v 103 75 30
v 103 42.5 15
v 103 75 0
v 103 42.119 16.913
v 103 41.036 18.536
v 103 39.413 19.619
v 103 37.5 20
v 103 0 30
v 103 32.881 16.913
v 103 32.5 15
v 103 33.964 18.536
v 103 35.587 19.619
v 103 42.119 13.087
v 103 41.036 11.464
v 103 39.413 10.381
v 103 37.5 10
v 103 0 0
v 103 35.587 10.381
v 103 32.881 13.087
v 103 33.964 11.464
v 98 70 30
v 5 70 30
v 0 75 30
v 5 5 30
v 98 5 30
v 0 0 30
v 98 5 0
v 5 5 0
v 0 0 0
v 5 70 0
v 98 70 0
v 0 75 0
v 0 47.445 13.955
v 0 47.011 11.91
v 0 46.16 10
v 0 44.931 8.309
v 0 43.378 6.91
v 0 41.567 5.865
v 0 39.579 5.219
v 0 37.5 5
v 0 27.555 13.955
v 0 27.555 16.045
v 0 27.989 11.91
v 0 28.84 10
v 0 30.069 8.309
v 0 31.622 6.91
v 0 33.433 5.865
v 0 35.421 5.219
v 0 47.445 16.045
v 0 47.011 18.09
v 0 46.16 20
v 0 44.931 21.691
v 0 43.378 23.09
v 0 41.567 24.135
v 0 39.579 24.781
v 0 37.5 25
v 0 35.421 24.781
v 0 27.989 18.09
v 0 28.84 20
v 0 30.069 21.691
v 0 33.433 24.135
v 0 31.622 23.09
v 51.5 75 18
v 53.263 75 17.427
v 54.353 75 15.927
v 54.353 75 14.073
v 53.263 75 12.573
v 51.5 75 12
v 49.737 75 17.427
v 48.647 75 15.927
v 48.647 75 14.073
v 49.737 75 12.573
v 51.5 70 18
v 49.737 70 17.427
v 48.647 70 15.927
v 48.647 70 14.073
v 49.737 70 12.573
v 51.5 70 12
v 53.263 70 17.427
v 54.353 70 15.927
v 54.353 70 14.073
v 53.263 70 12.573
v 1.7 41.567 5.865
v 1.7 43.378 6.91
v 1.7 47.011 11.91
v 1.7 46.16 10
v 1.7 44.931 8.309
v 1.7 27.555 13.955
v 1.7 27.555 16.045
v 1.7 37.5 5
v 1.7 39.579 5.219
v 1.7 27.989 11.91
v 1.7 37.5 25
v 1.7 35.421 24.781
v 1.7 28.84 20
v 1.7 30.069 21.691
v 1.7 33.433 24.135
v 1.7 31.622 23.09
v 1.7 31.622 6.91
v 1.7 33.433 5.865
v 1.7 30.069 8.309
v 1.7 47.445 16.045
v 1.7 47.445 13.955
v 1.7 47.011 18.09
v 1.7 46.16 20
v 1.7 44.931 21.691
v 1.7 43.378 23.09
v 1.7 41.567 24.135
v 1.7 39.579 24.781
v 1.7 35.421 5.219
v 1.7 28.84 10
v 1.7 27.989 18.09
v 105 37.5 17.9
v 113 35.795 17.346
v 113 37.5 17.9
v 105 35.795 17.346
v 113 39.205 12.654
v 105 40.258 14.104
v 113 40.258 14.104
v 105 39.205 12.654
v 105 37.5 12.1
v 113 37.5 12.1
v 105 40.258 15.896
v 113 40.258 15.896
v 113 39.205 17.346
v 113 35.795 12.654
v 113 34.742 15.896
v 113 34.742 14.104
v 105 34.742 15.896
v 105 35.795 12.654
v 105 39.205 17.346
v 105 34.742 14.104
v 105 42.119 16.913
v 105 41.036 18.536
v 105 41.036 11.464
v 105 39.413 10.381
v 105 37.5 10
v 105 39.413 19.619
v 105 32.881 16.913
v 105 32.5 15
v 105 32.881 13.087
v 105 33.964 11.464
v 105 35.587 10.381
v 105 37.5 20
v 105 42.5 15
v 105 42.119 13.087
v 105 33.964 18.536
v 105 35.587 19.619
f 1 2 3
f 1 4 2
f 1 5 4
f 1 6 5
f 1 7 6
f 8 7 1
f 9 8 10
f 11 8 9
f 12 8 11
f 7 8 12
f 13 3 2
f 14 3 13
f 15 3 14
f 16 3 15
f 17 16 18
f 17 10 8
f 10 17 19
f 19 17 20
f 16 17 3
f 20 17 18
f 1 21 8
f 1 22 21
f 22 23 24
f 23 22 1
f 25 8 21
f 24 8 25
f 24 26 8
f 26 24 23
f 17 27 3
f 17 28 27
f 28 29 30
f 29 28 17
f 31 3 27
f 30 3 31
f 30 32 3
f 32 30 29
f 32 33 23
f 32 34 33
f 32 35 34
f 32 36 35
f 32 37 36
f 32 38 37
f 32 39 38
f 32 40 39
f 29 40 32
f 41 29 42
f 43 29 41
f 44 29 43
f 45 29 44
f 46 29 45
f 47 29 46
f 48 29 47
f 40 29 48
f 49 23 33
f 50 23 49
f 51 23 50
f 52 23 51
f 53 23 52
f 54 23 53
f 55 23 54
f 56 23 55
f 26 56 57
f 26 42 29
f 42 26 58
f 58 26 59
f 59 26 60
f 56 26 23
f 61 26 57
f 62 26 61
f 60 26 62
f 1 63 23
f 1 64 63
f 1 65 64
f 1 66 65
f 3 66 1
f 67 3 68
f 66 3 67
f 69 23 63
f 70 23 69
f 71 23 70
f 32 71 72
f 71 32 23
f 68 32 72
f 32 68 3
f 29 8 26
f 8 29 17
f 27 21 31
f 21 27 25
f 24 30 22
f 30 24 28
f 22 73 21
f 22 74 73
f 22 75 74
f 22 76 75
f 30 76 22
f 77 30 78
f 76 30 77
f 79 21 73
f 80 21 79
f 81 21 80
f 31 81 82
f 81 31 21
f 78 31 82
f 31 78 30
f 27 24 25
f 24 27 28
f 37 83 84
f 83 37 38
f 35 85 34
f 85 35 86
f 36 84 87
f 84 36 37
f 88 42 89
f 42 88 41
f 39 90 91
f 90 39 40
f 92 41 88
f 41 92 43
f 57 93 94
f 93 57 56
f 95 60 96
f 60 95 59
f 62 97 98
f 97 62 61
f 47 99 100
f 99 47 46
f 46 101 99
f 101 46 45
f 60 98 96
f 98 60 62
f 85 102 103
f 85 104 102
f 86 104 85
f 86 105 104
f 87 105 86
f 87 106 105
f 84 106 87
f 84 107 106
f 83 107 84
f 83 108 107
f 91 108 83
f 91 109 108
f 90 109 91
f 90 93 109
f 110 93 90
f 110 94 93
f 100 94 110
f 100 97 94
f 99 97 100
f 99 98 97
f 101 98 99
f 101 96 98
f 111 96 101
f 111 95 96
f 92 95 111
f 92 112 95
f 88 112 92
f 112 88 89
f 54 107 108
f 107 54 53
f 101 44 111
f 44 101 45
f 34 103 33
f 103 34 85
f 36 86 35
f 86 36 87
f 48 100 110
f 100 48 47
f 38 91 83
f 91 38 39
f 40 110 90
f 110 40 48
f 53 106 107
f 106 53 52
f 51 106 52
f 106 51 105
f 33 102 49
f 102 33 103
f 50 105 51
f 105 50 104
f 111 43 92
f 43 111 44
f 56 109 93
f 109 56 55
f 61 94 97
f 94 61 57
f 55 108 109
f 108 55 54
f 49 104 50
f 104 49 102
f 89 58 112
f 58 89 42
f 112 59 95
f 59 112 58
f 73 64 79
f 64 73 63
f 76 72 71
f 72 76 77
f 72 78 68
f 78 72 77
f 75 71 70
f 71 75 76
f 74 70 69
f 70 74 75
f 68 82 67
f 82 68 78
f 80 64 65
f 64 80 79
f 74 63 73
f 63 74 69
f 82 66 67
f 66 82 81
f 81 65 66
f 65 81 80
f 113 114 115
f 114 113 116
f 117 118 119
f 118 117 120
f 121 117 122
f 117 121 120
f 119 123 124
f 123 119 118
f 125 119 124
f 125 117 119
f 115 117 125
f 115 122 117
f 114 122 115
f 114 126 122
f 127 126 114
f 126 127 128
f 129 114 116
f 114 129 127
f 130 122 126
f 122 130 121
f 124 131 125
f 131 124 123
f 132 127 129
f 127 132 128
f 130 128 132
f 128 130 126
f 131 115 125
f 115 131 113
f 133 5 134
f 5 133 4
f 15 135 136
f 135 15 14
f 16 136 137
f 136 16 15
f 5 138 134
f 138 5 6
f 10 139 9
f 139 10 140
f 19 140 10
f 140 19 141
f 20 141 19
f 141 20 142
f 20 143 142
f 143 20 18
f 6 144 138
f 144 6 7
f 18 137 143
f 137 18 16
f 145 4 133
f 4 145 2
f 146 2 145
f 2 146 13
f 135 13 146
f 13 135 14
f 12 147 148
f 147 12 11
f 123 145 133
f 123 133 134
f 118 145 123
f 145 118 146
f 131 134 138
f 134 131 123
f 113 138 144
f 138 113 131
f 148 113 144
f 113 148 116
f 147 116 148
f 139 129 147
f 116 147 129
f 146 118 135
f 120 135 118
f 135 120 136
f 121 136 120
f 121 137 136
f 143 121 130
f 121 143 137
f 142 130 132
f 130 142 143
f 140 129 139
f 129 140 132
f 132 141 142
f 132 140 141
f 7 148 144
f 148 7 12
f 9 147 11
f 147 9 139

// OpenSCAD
// file: servo.scad
include <variables.scad>

// Cutout for servo body
module servoCutout() {
    cube([servoWidth, servoHeight, supportThickness + DIFFERENCE_FIX_2]);
}

// Cutout for servo mounting plate
module servoPlateCutout() {
    cylinder(h = servoPlateThickness + DIFFERENCE_FIX_2, r = servoPlateRadius);
}
// file: variables.scad
// General
DIFFERENCE_FIX = 0.1;
DIFFERENCE_FIX_NEGATIVE = -1 * DIFFERENCE_FIX;
DIFFERENCE_FIX_2 = 2 * DIFFERENCE_FIX;

componentThickness = 5;

// Support
supportThickness = 8;
supportHoleHeight = 50;
supportWidth = 50;
supportTaper = 12;
supportBaseDepth = 15;

// Support right
supportRightHoleRadius = 3;

// Camera mount
cameraMountGoproWidth = 63;
cameraMountGoproHeight = 45;
cameraMountGoproDepth = 25;

cameraMountThickness = componentThickness;
cameraMountWidth = cameraMountGoproWidth + 2 * cameraMountThickness;
cameraMountHeight = cameraMountGoproHeight + 2 * cameraMountThickness;
cameraMountDepth = cameraMountGoproDepth + cameraMountThickness;

cameraMountShutterCutoutWidth = 13;
cameraMountShutterCutoutOffsetX = 8;
cameraMountShutterCutoutOffsetZ = 6;
cameraMountShutterCutoutGap = componentThickness;

cameraMountPowerCutoutDepth = 10;
cameraMountPowerCutoutHeight = 9;
cameraMountPowerCutoutOffsetY = 9;
cameraMountPowerCutoutOffsetZ = 7;
cameraMountPowerCutoutGap = componentThickness;

cameraMountBackCutoutOffset = 8;

cameraMountPinOffsetRadius = supportRightHoleRadius + 2;
cameraMountPinOffsetHeight = 2;
cameraMountPinRadiusOffset = 0.1;

// Frame
frameCameraMountOffsetX = 10;
frameCameraMountOffsetY = 5;
frameThickness = componentThickness;
frameWidth = cameraMountWidth + 2 * frameThickness + 2 * frameCameraMountOffsetX;
frameHeight = cameraMountHeight + 2 * frameThickness + 2 * frameCameraMountOffsetY;
frameDepth = 30;
frameHoleTopRadius = supportRightHoleRadius;

framePinOffsetRadius = cameraMountPinOffsetRadius;
framePinOffsetHeight = cameraMountPinOffsetHeight;
framePinRadiusOffset = cameraMountPinRadiusOffset;

// Servo cutout
servoWidth = 12;
servoHeight = 23.5;
servoOffsetTop = 6;

// Servo mounting plate
servoPlateRadius = 10;
servoPlateThickness = 1.6;
// main file
include <variables.scad>

use <servo.scad>

// Frame
module frame() {
    difference() {
        frameBody();
        frameServoCutout();
        frameHoleTop();
    }

    framePinRight();
}

// Frame body
module frameBody() {
    difference() {
        // Frame
        cube([
            frameWidth,
            frameHeight,
            frameDepth
        ]);

        // Frame cutout
        translate([frameThickness, frameThickness, DIFFERENCE_FIX_NEGATIVE])
        cube([
            frameWidth - 2 * frameThickness,
            frameHeight - 2 * frameThickness,
            frameDepth + DIFFERENCE_FIX_2
        ]);
    }
}

// Cutout for support servo mounting plate
module frameServoCutout() {
    translate([DIFFERENCE_FIX_NEGATIVE, frameHeight / 2, frameDepth / 2])
    rotate([0, 90, 0])
    servoPlateCutout();
}

// Pin for right support
module framePinRight() {
    translate([frameWidth, frameHeight / 2, frameDepth / 2])
    rotate([0, 90, 0])
    union() {
        cylinder(h = supportThickness + framePinOffsetHeight, r = supportRightHoleRadius - framePinRadiusOffset);
        cylinder(h = framePinOffsetHeight, r = framePinOffsetRadius);
    }
}

// Hole in the top for camera mount pin
module frameHoleTop() {
    translate([frameWidth / 2, frameHeight - frameThickness - DIFFERENCE_FIX, frameDepth / 2])
    rotate([0, 90, 90])
    cylinder(h = frameThickness + DIFFERENCE_FIX_2, r = frameHoleTopRadius);
}

frame();
